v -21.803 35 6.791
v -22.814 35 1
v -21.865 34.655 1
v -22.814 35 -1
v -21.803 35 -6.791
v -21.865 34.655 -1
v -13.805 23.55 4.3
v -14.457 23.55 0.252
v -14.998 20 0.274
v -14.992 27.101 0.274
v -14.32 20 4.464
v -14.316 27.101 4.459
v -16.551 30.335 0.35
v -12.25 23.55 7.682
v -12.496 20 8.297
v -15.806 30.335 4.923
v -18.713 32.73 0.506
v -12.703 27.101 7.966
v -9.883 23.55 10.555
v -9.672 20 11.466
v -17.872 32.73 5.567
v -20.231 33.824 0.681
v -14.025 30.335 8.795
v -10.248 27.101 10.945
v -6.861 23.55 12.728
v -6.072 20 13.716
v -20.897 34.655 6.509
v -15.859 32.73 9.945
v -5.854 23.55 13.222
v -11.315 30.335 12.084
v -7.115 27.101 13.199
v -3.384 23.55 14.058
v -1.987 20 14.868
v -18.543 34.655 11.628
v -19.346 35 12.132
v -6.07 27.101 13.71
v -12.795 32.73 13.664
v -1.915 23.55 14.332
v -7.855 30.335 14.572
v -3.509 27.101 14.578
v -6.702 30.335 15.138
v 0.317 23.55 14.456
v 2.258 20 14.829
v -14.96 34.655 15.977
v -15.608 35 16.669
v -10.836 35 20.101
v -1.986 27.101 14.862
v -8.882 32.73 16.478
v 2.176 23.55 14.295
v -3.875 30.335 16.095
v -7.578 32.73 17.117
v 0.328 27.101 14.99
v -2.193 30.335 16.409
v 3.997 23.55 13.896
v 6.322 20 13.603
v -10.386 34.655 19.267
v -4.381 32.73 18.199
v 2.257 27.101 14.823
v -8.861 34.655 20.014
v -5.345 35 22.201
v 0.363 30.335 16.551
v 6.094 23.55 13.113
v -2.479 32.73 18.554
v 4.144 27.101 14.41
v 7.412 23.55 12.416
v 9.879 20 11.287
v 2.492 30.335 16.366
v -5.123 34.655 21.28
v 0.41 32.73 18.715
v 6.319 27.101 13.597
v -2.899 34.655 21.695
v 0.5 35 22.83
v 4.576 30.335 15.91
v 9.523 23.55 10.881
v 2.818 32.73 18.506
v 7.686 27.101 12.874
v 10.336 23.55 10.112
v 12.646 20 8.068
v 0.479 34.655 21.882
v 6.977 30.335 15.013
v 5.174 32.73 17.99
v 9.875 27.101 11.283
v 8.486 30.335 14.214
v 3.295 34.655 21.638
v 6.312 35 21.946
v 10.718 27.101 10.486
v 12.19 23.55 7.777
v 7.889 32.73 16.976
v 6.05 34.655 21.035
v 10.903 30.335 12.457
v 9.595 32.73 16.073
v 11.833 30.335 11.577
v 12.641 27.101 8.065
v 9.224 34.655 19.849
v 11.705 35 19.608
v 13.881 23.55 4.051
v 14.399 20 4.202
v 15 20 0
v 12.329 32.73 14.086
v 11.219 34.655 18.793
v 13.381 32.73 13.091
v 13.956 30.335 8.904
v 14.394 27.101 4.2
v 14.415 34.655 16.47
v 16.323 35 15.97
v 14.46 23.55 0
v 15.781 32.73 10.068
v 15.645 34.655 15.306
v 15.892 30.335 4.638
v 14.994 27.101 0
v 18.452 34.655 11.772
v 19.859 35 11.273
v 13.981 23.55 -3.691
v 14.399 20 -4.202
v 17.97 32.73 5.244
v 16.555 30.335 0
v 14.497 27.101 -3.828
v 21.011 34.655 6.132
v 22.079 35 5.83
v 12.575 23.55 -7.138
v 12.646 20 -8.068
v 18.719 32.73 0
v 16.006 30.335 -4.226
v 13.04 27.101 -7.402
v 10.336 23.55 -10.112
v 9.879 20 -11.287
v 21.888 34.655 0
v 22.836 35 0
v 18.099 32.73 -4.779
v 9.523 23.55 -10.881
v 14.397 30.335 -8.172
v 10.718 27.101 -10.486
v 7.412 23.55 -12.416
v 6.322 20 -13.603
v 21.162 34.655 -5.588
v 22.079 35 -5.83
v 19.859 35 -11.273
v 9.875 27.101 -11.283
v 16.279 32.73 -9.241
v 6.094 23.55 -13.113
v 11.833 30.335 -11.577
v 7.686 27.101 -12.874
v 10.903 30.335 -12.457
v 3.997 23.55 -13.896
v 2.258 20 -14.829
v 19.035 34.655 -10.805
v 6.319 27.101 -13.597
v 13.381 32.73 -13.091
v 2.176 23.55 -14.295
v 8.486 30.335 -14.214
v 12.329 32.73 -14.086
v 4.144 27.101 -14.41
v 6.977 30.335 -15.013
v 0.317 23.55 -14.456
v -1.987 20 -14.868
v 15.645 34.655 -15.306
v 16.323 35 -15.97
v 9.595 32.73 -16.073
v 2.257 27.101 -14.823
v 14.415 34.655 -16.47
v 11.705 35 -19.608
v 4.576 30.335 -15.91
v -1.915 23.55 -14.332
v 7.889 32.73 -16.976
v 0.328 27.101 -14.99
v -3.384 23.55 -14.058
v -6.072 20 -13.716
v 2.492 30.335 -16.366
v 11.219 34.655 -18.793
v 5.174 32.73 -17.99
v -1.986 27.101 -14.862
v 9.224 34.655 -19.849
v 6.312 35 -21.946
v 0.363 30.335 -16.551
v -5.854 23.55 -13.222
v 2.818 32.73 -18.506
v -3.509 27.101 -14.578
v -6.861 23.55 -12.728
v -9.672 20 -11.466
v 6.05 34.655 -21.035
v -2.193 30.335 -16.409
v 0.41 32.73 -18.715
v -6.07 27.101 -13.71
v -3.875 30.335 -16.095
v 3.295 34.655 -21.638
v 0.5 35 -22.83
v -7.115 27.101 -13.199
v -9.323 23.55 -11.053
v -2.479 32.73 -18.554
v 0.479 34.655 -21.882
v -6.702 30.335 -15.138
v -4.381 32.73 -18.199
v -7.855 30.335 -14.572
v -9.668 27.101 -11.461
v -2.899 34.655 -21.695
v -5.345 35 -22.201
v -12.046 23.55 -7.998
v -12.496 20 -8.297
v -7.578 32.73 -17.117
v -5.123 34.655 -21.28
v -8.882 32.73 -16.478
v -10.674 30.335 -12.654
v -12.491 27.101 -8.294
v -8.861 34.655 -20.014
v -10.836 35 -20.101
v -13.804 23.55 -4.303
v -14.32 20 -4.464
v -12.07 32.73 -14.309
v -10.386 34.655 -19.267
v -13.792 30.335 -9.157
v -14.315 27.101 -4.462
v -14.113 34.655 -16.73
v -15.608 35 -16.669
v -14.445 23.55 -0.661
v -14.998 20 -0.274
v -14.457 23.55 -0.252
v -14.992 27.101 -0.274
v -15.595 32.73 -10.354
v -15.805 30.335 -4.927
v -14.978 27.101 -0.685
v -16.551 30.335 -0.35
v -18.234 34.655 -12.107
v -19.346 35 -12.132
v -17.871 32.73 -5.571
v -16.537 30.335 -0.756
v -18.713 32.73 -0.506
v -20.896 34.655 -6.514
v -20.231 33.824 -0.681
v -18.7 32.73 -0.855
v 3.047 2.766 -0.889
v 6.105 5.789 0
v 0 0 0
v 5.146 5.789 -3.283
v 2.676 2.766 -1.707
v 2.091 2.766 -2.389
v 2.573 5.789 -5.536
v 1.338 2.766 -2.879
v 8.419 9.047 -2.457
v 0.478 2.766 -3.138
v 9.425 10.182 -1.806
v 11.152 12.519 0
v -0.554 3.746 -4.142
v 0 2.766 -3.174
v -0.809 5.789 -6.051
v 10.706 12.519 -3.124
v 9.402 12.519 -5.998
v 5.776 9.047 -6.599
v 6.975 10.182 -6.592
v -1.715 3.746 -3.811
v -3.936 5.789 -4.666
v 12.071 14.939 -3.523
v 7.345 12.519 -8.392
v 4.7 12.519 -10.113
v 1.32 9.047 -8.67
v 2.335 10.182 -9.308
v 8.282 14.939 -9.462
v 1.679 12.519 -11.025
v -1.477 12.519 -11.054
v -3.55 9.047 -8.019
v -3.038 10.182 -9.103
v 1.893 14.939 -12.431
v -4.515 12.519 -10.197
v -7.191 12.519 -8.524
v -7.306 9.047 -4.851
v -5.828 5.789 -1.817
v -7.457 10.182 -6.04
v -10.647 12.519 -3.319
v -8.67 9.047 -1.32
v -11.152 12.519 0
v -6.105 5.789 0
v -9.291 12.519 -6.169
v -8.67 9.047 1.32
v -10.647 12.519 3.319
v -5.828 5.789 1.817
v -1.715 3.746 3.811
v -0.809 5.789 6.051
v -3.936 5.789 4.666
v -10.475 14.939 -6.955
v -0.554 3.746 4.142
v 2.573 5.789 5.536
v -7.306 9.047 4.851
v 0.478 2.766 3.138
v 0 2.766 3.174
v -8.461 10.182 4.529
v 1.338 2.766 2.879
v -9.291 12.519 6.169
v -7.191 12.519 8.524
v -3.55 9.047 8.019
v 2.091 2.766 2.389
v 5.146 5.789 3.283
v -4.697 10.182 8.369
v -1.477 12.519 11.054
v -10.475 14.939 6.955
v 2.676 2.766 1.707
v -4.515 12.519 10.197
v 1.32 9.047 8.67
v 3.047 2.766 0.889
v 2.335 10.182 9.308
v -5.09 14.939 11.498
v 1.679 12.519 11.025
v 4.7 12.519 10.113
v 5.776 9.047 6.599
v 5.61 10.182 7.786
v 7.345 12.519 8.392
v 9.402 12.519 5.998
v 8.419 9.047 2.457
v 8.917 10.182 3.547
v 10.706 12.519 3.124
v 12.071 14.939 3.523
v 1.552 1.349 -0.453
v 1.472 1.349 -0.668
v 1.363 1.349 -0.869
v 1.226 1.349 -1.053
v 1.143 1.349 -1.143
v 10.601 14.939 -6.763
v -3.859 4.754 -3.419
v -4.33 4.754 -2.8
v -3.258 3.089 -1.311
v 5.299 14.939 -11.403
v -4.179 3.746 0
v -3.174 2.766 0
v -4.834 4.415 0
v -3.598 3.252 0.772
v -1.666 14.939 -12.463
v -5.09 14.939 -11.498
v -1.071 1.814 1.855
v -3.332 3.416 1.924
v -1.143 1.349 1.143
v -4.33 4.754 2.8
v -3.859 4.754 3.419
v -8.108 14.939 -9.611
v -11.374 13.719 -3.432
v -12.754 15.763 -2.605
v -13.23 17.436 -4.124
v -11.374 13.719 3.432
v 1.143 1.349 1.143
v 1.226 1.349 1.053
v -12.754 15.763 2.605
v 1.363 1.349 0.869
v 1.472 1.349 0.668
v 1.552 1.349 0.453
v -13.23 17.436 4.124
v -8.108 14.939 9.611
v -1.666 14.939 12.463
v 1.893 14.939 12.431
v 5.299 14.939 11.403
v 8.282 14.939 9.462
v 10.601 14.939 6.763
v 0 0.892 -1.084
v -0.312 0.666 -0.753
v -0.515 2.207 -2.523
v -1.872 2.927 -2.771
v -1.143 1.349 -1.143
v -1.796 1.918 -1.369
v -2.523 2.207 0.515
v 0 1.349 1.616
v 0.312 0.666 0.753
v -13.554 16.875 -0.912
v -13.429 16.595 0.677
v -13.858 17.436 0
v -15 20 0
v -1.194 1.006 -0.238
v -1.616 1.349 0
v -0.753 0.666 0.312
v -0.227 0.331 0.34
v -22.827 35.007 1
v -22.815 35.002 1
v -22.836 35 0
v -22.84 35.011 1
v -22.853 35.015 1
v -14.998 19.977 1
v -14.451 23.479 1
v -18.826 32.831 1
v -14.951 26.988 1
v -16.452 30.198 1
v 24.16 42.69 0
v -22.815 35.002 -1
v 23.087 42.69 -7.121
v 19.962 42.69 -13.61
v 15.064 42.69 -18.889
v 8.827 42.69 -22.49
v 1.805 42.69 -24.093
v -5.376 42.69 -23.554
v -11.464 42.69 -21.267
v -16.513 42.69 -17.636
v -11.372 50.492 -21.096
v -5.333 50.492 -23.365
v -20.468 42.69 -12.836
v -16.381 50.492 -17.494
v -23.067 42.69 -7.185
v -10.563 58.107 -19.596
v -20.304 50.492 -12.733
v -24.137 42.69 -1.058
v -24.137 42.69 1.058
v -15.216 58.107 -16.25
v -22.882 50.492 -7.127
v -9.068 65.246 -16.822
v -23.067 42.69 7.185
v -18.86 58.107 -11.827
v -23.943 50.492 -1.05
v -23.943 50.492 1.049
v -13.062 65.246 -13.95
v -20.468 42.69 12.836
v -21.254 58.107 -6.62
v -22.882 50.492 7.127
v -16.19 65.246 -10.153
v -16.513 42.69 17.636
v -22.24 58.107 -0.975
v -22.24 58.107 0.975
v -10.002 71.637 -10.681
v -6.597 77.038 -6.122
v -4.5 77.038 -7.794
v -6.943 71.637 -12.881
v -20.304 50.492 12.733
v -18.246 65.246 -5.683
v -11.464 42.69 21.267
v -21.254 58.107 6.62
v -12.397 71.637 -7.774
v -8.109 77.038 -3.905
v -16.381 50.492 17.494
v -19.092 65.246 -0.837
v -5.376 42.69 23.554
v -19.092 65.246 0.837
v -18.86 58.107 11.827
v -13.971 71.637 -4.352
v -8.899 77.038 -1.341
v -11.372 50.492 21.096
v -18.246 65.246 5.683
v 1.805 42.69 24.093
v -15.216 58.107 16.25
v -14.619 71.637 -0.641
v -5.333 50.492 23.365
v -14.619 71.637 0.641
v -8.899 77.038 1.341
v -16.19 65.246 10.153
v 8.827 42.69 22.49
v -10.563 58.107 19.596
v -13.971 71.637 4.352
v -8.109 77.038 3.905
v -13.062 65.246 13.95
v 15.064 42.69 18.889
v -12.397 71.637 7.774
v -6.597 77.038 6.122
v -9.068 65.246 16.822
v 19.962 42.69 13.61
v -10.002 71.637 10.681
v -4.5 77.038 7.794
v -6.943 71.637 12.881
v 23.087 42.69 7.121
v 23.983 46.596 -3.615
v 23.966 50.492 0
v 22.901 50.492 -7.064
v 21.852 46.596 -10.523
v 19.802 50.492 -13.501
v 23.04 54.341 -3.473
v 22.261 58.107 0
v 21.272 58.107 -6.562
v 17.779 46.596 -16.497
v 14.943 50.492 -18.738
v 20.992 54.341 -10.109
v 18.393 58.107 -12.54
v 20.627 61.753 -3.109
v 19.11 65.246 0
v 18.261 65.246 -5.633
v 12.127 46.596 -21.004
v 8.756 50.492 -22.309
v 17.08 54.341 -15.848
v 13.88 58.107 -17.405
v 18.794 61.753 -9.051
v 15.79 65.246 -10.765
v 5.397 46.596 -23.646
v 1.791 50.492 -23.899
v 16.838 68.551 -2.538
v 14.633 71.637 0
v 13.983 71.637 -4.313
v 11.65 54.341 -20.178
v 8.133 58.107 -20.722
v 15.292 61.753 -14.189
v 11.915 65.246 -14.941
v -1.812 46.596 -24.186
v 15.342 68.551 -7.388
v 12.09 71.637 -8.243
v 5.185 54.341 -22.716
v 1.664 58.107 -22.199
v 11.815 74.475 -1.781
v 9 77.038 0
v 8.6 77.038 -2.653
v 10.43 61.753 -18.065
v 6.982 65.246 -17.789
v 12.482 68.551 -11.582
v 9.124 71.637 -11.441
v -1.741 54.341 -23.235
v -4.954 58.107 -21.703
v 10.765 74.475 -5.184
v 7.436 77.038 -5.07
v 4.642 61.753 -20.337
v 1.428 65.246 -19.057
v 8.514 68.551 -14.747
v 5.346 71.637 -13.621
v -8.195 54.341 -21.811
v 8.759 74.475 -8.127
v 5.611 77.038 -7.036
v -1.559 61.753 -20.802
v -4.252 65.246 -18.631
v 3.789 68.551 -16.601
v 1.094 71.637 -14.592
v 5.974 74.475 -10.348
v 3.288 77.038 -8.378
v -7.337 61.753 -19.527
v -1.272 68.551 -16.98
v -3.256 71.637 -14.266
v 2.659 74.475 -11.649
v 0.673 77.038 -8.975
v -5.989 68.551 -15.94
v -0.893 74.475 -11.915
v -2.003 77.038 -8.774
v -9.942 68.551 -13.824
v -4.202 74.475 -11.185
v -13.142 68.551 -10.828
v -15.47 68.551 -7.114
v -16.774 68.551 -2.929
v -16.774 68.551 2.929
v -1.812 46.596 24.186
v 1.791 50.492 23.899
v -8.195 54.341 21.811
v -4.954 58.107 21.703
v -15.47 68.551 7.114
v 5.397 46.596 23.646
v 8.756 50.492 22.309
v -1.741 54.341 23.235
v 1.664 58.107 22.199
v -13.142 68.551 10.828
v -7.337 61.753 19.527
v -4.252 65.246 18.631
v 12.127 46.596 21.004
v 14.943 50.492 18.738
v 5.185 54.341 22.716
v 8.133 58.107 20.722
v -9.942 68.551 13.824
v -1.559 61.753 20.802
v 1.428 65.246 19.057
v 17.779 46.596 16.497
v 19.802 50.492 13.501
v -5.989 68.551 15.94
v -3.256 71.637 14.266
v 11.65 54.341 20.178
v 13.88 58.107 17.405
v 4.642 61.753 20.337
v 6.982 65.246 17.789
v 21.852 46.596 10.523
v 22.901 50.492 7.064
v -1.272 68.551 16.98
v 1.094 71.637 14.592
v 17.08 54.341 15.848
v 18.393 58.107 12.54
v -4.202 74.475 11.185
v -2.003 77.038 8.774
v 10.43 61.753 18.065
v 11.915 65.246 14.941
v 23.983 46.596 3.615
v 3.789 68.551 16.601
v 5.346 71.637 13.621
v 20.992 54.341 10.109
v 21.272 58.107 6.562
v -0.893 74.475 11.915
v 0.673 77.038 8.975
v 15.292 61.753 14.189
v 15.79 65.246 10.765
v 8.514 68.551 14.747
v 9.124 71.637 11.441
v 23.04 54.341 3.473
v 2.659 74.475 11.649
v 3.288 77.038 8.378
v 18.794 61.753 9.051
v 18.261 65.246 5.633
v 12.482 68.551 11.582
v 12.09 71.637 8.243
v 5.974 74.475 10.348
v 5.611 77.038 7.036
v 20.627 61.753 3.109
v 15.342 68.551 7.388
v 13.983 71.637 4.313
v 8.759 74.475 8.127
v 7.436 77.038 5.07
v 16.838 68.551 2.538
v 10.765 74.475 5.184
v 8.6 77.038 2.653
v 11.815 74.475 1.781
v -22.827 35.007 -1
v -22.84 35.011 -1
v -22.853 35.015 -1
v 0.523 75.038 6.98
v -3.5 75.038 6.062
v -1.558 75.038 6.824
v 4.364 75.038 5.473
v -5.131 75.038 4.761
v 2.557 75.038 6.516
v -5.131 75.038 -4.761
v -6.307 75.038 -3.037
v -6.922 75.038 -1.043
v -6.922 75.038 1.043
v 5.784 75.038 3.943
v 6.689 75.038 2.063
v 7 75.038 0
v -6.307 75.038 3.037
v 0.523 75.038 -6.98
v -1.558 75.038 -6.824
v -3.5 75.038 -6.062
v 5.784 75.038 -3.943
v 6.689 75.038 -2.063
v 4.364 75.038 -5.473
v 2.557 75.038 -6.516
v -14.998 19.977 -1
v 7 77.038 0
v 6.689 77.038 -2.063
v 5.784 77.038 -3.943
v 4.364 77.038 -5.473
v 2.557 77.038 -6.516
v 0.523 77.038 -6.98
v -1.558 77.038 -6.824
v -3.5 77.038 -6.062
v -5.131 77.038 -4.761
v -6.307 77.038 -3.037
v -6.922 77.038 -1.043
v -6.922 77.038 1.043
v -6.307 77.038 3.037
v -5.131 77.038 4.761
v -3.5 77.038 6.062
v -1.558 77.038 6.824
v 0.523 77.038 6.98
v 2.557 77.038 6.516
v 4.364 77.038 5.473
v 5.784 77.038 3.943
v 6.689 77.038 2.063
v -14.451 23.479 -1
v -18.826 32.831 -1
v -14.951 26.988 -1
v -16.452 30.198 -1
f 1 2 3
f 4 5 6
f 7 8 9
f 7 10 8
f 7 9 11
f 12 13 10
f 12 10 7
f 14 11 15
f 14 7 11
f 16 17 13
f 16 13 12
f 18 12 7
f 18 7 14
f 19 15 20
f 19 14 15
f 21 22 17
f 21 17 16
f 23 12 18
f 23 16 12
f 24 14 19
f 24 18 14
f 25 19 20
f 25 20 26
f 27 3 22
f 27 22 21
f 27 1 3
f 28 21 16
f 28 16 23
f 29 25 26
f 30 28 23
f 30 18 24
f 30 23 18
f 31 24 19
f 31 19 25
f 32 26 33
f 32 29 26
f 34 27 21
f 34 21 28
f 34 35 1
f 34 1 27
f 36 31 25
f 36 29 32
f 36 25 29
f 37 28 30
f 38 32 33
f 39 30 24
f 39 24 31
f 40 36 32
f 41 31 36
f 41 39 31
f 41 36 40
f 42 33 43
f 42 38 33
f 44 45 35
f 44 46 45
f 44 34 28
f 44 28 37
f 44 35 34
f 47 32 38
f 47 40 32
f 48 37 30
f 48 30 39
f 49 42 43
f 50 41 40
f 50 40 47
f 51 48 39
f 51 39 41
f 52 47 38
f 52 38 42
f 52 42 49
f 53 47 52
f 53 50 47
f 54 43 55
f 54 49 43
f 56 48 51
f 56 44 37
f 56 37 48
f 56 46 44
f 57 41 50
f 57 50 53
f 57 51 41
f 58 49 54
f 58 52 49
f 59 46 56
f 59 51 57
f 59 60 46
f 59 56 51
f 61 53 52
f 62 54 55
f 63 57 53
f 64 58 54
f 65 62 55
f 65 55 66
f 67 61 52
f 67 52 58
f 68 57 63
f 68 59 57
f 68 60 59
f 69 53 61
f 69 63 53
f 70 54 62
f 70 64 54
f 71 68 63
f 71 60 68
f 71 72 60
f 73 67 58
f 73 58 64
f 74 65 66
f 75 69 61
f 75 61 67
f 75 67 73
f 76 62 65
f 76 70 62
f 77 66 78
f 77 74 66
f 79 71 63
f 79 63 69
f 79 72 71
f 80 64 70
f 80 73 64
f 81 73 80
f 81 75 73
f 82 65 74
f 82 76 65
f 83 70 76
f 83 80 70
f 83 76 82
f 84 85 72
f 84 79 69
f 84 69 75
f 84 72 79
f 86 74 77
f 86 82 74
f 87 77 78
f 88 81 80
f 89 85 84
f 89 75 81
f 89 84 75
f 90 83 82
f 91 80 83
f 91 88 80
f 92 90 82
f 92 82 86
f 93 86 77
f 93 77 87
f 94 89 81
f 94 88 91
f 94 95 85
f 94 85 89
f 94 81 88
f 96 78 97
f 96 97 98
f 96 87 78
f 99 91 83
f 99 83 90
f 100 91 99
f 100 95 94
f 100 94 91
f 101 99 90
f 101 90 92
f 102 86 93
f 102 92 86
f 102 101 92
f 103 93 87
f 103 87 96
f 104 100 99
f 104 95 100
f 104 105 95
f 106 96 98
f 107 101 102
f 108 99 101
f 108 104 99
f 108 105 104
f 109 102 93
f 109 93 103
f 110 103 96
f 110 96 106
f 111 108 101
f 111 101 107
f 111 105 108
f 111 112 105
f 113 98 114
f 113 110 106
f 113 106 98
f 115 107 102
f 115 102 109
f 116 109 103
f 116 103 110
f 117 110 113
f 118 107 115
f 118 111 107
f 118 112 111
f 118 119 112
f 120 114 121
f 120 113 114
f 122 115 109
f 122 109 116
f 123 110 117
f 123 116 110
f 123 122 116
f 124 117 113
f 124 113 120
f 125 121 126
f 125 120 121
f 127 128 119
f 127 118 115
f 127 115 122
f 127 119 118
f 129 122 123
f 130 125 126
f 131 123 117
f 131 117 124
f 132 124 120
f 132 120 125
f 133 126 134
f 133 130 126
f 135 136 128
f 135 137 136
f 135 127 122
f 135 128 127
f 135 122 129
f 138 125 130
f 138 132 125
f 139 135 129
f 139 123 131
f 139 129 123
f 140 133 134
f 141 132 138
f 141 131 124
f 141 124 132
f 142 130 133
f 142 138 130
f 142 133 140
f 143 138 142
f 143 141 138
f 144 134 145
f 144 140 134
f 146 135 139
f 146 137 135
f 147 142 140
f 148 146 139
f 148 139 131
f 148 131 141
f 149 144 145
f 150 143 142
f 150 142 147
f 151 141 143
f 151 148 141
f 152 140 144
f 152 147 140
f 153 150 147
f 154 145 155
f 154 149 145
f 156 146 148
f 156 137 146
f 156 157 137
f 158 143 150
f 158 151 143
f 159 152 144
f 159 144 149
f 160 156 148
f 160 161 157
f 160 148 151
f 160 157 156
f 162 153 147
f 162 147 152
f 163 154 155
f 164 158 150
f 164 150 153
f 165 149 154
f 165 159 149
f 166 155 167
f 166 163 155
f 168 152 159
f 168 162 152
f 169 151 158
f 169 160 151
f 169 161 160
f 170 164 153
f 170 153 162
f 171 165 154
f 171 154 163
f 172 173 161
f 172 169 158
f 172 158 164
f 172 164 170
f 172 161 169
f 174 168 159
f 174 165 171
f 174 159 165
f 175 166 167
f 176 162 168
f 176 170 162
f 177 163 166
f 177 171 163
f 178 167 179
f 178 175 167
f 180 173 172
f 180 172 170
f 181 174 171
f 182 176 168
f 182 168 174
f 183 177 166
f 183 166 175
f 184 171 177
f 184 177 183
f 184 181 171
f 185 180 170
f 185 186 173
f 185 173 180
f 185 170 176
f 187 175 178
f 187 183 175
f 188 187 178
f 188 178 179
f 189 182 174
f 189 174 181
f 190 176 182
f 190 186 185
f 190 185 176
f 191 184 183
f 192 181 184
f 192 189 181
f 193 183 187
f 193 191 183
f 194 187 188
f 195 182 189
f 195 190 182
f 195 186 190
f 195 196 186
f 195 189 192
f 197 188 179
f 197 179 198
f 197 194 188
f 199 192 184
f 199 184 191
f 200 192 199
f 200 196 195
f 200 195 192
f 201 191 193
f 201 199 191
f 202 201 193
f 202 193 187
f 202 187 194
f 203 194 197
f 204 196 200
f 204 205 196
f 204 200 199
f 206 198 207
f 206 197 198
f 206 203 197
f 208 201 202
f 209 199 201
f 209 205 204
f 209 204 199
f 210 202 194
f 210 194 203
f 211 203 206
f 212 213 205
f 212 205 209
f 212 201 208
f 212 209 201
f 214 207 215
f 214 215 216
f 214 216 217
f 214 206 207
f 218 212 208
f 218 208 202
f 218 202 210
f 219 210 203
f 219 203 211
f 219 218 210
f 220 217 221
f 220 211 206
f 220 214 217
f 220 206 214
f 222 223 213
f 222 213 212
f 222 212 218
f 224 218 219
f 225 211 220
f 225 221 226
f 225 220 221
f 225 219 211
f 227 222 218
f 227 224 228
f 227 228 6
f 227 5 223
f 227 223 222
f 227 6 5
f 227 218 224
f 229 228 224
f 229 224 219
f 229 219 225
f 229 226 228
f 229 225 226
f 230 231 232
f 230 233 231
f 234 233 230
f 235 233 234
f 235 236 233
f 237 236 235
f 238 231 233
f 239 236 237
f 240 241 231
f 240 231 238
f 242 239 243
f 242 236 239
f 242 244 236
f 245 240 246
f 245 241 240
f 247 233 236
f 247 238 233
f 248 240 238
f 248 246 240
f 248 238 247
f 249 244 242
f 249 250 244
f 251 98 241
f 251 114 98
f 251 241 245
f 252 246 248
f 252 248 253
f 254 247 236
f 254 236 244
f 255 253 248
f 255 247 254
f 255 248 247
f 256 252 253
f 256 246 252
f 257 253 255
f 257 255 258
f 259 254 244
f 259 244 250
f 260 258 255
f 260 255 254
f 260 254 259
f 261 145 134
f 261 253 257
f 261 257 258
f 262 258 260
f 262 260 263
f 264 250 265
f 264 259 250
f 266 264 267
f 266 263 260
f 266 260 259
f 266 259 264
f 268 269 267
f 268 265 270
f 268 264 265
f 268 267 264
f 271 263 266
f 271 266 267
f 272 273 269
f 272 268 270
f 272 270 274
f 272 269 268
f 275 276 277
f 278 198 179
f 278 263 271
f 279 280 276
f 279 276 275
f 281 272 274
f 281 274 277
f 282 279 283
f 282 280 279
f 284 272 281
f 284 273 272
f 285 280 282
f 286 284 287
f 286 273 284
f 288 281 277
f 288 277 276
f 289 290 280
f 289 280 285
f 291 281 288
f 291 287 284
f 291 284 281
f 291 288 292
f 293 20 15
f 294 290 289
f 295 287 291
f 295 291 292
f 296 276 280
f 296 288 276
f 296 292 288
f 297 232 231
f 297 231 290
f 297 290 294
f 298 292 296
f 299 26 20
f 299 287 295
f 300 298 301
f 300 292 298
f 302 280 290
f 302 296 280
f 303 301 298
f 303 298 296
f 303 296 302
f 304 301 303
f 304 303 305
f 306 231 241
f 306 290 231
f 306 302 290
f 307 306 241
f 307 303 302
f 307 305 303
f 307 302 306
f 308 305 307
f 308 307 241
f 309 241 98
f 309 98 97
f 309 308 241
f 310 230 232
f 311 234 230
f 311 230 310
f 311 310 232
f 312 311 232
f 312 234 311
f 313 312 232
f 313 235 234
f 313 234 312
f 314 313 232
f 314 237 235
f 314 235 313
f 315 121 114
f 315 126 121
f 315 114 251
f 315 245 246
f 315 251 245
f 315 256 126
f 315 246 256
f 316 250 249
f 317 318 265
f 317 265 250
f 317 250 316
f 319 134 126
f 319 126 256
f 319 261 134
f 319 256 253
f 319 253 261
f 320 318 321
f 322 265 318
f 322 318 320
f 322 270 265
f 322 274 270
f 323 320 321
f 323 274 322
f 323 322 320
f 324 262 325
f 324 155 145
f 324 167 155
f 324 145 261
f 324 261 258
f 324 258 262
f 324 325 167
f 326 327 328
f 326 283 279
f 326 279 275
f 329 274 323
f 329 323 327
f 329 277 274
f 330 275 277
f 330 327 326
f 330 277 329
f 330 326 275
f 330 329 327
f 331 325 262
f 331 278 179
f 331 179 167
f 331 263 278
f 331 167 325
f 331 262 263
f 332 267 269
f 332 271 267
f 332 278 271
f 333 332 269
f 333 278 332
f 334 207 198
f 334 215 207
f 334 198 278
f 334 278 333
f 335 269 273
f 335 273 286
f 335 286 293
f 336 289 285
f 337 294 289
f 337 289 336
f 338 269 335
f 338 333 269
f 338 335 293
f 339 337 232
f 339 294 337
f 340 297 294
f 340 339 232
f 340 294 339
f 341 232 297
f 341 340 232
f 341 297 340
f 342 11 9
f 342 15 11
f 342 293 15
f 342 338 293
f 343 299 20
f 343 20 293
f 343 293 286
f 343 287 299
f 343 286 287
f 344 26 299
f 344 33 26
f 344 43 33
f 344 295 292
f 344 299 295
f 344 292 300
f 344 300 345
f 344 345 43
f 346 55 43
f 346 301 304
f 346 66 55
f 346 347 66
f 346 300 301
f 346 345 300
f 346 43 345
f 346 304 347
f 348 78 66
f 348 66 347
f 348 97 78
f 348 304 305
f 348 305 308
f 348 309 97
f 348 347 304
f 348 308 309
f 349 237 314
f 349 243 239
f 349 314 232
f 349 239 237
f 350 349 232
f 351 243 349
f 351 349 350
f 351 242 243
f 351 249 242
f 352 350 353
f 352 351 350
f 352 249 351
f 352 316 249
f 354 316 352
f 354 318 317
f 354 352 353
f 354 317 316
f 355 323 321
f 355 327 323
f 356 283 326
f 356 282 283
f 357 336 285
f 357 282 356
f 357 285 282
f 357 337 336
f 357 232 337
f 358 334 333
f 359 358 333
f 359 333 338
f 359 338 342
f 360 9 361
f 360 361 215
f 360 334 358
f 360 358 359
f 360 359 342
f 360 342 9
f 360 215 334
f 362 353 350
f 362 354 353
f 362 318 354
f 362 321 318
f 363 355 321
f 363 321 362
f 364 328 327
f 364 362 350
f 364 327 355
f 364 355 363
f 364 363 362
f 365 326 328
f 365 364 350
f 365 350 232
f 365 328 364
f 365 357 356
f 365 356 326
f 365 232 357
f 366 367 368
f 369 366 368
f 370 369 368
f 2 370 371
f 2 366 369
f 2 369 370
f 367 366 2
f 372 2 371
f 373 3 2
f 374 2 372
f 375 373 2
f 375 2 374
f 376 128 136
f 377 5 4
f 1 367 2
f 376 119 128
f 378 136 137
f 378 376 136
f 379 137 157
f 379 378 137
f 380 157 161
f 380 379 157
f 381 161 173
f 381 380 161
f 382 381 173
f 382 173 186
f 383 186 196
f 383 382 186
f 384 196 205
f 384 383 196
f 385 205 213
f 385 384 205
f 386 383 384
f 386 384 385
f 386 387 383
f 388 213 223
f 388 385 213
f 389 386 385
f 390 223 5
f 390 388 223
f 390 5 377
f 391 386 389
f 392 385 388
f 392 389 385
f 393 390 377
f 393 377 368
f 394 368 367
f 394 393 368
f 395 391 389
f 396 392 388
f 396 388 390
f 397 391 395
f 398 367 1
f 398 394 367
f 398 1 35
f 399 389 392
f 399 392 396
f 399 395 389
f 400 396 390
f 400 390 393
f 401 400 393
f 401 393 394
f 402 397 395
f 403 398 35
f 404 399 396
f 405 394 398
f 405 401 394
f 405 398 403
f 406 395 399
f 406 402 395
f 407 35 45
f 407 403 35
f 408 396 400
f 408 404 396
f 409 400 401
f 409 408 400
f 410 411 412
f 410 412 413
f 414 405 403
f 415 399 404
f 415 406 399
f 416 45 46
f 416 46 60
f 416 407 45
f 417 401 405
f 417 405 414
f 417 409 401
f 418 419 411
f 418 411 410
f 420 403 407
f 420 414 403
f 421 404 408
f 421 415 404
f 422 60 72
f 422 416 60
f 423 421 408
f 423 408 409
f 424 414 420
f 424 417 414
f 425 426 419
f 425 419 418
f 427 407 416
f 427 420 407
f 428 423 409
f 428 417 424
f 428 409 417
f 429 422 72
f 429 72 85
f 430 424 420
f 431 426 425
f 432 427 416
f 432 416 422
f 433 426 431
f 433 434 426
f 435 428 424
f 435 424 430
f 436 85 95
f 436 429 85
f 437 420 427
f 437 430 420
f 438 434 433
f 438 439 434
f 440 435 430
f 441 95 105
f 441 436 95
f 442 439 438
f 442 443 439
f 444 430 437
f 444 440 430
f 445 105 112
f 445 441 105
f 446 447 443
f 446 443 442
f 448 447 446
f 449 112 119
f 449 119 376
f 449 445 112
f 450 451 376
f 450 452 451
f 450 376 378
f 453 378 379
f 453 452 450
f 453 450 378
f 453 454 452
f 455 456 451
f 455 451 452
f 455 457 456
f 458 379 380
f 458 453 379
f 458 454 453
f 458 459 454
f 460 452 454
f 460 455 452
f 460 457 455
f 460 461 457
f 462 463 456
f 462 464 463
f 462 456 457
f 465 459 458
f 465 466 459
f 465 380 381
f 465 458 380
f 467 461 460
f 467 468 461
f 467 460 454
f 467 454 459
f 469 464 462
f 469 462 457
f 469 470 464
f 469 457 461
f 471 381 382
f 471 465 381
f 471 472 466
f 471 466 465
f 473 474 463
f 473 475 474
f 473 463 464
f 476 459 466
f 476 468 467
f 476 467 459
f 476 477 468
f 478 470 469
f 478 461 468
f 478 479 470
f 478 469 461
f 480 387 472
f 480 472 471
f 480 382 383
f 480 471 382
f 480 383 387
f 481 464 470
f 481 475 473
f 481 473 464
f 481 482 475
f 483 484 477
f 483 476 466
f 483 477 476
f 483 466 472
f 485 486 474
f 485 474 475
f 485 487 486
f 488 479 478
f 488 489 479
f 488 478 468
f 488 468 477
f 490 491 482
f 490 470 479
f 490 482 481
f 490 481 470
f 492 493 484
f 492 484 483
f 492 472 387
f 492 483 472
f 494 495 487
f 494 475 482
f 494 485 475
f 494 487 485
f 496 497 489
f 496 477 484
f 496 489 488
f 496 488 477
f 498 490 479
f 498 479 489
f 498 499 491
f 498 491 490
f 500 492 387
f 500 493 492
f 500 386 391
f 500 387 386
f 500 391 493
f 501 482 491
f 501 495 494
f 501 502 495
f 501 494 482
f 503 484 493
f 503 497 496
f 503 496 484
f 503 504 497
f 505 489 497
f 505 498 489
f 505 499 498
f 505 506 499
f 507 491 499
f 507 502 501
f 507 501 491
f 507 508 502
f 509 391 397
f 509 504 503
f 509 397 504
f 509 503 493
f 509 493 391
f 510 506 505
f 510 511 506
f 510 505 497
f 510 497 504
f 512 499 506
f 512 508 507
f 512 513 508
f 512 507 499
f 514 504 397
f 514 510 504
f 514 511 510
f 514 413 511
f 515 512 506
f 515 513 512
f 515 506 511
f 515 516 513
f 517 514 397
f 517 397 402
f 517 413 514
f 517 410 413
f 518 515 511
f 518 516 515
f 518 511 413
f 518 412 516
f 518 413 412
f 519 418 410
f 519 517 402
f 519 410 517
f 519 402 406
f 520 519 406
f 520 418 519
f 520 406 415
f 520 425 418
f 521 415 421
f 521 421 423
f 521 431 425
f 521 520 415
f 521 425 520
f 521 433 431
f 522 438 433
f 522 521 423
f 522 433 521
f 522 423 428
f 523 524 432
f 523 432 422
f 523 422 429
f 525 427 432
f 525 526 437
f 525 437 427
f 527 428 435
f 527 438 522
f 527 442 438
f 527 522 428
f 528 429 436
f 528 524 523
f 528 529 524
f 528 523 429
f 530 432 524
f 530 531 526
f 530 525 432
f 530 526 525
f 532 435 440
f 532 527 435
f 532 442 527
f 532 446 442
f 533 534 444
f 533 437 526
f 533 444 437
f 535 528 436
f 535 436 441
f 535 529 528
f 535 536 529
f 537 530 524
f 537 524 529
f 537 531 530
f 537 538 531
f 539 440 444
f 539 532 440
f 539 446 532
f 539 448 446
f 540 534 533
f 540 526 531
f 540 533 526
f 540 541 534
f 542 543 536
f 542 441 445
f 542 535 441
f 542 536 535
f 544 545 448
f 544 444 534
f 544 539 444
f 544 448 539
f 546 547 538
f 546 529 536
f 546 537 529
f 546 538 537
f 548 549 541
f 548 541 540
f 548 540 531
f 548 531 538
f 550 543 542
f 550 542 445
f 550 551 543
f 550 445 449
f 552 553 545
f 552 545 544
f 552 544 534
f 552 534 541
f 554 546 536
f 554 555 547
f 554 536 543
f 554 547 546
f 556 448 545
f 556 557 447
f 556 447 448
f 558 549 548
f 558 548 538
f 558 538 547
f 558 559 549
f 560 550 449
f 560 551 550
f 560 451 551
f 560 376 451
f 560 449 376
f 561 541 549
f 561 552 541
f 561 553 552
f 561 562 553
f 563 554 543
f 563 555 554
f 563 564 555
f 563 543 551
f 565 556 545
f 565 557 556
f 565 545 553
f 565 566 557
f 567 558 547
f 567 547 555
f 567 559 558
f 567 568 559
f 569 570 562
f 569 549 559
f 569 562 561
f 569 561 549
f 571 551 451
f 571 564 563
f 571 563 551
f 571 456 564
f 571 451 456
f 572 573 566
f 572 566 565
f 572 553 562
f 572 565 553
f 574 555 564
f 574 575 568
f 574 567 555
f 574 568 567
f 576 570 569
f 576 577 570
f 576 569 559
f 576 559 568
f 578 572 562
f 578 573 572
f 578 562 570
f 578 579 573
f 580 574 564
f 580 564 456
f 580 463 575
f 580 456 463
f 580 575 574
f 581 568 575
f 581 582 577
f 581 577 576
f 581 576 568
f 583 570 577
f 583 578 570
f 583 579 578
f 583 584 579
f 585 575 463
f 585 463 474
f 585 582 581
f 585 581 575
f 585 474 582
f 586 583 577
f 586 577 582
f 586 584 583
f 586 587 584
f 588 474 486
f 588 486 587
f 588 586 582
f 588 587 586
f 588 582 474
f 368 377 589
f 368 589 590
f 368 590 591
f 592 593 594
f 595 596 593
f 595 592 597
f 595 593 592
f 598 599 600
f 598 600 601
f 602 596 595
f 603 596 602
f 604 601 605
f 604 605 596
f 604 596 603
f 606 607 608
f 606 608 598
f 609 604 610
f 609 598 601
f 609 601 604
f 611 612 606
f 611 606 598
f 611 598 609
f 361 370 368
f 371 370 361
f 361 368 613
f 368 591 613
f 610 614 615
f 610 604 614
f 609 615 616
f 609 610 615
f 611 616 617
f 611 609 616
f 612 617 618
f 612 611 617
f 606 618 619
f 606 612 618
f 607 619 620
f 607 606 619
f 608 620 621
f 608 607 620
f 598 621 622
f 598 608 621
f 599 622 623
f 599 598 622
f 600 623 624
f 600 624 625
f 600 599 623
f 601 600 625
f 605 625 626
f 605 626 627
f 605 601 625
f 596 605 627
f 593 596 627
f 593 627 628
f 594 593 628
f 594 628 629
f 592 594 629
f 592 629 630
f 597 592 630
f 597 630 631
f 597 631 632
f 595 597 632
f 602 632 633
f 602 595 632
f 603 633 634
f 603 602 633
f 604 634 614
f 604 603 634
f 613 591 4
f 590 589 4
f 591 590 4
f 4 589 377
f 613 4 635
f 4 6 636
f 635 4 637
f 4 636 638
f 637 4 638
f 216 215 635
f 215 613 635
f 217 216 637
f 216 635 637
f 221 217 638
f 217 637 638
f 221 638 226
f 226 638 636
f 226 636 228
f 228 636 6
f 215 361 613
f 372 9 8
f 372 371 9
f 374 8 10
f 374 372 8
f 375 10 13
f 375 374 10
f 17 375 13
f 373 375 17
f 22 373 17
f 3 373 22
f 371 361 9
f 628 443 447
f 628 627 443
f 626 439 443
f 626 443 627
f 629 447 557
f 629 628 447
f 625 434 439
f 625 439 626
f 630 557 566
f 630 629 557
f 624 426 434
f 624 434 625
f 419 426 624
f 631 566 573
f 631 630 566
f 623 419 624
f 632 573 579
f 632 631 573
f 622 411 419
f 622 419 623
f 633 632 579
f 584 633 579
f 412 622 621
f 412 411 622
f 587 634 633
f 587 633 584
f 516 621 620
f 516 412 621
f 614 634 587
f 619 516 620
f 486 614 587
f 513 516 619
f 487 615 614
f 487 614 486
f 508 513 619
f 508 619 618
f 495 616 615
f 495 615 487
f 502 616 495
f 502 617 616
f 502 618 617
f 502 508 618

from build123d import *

# Parameters (mm, degrees)
F3_DEPTH = 25
F6_DEPTH = 1
F6_TAPER = -0.5


with BuildPart() as f1:
    # F0 (on Top) → F1 (revolve)
    with BuildSketch(Plane.XY):
        with BuildLine():
            Line((0, 20), (0, 0))
            ThreePointArc((0, 0), (8.7701665379, 9.0473750966), (15, 20))
            Line((15, 20), (0, 20))
        make_face()
        with BuildLine():
            Line((0, 35), (0, 20))
            Line((0, 20), (15, 20))
            ThreePointArc((15, 20), (15.8234787517, 29.1164619428), (22.8357519594, 35))
            Line((22.8357519594, 35), (0, 35))
        make_face()
        with BuildLine():
            Line((0, 75.0377376154), (0, 35))
            Line((0, 35), (22.8357519594, 35))
            ThreePointArc((22.8357519594, 35), (22.2612211458, 58.1066345936), (9, 77.0377376154))
            Line((9, 77.0377376154), (7, 77.0377376154))
            Line((7, 77.0377376154), (7, 75.0377376154))
            Line((7, 75.0377376154), (0, 75.0377376154))
        make_face()
    revolve(axis=Axis((0, 38.5188688077, 0), (0, 1, 0)))

    # F5 (on Top) → F6 (join, symmetric)
    with BuildSketch(Plane.XY):
        with BuildLine():
            ThreePointArc((-15, 20), (-15.8234787517, 29.1164619428), (-22.8357519594, 35))
            Line((-22.8357519594, 35), (-15, 20))
        make_face()
    extrude(amount=F6_DEPTH, both=True, taper=F6_TAPER)


with BuildPart() as f3:
    # F2 (on Top) → F3 (new body)
    with BuildSketch(Plane.XY):
        with BuildLine():
            Line((-22.8357519594, 35), (-15, 20))
            ThreePointArc((-15, 20), (-15.8234787517, 29.1164619428), (-22.8357519594, 35))
        make_face()
    extrude(amount=F3_DEPTH)


solid = f1.part
